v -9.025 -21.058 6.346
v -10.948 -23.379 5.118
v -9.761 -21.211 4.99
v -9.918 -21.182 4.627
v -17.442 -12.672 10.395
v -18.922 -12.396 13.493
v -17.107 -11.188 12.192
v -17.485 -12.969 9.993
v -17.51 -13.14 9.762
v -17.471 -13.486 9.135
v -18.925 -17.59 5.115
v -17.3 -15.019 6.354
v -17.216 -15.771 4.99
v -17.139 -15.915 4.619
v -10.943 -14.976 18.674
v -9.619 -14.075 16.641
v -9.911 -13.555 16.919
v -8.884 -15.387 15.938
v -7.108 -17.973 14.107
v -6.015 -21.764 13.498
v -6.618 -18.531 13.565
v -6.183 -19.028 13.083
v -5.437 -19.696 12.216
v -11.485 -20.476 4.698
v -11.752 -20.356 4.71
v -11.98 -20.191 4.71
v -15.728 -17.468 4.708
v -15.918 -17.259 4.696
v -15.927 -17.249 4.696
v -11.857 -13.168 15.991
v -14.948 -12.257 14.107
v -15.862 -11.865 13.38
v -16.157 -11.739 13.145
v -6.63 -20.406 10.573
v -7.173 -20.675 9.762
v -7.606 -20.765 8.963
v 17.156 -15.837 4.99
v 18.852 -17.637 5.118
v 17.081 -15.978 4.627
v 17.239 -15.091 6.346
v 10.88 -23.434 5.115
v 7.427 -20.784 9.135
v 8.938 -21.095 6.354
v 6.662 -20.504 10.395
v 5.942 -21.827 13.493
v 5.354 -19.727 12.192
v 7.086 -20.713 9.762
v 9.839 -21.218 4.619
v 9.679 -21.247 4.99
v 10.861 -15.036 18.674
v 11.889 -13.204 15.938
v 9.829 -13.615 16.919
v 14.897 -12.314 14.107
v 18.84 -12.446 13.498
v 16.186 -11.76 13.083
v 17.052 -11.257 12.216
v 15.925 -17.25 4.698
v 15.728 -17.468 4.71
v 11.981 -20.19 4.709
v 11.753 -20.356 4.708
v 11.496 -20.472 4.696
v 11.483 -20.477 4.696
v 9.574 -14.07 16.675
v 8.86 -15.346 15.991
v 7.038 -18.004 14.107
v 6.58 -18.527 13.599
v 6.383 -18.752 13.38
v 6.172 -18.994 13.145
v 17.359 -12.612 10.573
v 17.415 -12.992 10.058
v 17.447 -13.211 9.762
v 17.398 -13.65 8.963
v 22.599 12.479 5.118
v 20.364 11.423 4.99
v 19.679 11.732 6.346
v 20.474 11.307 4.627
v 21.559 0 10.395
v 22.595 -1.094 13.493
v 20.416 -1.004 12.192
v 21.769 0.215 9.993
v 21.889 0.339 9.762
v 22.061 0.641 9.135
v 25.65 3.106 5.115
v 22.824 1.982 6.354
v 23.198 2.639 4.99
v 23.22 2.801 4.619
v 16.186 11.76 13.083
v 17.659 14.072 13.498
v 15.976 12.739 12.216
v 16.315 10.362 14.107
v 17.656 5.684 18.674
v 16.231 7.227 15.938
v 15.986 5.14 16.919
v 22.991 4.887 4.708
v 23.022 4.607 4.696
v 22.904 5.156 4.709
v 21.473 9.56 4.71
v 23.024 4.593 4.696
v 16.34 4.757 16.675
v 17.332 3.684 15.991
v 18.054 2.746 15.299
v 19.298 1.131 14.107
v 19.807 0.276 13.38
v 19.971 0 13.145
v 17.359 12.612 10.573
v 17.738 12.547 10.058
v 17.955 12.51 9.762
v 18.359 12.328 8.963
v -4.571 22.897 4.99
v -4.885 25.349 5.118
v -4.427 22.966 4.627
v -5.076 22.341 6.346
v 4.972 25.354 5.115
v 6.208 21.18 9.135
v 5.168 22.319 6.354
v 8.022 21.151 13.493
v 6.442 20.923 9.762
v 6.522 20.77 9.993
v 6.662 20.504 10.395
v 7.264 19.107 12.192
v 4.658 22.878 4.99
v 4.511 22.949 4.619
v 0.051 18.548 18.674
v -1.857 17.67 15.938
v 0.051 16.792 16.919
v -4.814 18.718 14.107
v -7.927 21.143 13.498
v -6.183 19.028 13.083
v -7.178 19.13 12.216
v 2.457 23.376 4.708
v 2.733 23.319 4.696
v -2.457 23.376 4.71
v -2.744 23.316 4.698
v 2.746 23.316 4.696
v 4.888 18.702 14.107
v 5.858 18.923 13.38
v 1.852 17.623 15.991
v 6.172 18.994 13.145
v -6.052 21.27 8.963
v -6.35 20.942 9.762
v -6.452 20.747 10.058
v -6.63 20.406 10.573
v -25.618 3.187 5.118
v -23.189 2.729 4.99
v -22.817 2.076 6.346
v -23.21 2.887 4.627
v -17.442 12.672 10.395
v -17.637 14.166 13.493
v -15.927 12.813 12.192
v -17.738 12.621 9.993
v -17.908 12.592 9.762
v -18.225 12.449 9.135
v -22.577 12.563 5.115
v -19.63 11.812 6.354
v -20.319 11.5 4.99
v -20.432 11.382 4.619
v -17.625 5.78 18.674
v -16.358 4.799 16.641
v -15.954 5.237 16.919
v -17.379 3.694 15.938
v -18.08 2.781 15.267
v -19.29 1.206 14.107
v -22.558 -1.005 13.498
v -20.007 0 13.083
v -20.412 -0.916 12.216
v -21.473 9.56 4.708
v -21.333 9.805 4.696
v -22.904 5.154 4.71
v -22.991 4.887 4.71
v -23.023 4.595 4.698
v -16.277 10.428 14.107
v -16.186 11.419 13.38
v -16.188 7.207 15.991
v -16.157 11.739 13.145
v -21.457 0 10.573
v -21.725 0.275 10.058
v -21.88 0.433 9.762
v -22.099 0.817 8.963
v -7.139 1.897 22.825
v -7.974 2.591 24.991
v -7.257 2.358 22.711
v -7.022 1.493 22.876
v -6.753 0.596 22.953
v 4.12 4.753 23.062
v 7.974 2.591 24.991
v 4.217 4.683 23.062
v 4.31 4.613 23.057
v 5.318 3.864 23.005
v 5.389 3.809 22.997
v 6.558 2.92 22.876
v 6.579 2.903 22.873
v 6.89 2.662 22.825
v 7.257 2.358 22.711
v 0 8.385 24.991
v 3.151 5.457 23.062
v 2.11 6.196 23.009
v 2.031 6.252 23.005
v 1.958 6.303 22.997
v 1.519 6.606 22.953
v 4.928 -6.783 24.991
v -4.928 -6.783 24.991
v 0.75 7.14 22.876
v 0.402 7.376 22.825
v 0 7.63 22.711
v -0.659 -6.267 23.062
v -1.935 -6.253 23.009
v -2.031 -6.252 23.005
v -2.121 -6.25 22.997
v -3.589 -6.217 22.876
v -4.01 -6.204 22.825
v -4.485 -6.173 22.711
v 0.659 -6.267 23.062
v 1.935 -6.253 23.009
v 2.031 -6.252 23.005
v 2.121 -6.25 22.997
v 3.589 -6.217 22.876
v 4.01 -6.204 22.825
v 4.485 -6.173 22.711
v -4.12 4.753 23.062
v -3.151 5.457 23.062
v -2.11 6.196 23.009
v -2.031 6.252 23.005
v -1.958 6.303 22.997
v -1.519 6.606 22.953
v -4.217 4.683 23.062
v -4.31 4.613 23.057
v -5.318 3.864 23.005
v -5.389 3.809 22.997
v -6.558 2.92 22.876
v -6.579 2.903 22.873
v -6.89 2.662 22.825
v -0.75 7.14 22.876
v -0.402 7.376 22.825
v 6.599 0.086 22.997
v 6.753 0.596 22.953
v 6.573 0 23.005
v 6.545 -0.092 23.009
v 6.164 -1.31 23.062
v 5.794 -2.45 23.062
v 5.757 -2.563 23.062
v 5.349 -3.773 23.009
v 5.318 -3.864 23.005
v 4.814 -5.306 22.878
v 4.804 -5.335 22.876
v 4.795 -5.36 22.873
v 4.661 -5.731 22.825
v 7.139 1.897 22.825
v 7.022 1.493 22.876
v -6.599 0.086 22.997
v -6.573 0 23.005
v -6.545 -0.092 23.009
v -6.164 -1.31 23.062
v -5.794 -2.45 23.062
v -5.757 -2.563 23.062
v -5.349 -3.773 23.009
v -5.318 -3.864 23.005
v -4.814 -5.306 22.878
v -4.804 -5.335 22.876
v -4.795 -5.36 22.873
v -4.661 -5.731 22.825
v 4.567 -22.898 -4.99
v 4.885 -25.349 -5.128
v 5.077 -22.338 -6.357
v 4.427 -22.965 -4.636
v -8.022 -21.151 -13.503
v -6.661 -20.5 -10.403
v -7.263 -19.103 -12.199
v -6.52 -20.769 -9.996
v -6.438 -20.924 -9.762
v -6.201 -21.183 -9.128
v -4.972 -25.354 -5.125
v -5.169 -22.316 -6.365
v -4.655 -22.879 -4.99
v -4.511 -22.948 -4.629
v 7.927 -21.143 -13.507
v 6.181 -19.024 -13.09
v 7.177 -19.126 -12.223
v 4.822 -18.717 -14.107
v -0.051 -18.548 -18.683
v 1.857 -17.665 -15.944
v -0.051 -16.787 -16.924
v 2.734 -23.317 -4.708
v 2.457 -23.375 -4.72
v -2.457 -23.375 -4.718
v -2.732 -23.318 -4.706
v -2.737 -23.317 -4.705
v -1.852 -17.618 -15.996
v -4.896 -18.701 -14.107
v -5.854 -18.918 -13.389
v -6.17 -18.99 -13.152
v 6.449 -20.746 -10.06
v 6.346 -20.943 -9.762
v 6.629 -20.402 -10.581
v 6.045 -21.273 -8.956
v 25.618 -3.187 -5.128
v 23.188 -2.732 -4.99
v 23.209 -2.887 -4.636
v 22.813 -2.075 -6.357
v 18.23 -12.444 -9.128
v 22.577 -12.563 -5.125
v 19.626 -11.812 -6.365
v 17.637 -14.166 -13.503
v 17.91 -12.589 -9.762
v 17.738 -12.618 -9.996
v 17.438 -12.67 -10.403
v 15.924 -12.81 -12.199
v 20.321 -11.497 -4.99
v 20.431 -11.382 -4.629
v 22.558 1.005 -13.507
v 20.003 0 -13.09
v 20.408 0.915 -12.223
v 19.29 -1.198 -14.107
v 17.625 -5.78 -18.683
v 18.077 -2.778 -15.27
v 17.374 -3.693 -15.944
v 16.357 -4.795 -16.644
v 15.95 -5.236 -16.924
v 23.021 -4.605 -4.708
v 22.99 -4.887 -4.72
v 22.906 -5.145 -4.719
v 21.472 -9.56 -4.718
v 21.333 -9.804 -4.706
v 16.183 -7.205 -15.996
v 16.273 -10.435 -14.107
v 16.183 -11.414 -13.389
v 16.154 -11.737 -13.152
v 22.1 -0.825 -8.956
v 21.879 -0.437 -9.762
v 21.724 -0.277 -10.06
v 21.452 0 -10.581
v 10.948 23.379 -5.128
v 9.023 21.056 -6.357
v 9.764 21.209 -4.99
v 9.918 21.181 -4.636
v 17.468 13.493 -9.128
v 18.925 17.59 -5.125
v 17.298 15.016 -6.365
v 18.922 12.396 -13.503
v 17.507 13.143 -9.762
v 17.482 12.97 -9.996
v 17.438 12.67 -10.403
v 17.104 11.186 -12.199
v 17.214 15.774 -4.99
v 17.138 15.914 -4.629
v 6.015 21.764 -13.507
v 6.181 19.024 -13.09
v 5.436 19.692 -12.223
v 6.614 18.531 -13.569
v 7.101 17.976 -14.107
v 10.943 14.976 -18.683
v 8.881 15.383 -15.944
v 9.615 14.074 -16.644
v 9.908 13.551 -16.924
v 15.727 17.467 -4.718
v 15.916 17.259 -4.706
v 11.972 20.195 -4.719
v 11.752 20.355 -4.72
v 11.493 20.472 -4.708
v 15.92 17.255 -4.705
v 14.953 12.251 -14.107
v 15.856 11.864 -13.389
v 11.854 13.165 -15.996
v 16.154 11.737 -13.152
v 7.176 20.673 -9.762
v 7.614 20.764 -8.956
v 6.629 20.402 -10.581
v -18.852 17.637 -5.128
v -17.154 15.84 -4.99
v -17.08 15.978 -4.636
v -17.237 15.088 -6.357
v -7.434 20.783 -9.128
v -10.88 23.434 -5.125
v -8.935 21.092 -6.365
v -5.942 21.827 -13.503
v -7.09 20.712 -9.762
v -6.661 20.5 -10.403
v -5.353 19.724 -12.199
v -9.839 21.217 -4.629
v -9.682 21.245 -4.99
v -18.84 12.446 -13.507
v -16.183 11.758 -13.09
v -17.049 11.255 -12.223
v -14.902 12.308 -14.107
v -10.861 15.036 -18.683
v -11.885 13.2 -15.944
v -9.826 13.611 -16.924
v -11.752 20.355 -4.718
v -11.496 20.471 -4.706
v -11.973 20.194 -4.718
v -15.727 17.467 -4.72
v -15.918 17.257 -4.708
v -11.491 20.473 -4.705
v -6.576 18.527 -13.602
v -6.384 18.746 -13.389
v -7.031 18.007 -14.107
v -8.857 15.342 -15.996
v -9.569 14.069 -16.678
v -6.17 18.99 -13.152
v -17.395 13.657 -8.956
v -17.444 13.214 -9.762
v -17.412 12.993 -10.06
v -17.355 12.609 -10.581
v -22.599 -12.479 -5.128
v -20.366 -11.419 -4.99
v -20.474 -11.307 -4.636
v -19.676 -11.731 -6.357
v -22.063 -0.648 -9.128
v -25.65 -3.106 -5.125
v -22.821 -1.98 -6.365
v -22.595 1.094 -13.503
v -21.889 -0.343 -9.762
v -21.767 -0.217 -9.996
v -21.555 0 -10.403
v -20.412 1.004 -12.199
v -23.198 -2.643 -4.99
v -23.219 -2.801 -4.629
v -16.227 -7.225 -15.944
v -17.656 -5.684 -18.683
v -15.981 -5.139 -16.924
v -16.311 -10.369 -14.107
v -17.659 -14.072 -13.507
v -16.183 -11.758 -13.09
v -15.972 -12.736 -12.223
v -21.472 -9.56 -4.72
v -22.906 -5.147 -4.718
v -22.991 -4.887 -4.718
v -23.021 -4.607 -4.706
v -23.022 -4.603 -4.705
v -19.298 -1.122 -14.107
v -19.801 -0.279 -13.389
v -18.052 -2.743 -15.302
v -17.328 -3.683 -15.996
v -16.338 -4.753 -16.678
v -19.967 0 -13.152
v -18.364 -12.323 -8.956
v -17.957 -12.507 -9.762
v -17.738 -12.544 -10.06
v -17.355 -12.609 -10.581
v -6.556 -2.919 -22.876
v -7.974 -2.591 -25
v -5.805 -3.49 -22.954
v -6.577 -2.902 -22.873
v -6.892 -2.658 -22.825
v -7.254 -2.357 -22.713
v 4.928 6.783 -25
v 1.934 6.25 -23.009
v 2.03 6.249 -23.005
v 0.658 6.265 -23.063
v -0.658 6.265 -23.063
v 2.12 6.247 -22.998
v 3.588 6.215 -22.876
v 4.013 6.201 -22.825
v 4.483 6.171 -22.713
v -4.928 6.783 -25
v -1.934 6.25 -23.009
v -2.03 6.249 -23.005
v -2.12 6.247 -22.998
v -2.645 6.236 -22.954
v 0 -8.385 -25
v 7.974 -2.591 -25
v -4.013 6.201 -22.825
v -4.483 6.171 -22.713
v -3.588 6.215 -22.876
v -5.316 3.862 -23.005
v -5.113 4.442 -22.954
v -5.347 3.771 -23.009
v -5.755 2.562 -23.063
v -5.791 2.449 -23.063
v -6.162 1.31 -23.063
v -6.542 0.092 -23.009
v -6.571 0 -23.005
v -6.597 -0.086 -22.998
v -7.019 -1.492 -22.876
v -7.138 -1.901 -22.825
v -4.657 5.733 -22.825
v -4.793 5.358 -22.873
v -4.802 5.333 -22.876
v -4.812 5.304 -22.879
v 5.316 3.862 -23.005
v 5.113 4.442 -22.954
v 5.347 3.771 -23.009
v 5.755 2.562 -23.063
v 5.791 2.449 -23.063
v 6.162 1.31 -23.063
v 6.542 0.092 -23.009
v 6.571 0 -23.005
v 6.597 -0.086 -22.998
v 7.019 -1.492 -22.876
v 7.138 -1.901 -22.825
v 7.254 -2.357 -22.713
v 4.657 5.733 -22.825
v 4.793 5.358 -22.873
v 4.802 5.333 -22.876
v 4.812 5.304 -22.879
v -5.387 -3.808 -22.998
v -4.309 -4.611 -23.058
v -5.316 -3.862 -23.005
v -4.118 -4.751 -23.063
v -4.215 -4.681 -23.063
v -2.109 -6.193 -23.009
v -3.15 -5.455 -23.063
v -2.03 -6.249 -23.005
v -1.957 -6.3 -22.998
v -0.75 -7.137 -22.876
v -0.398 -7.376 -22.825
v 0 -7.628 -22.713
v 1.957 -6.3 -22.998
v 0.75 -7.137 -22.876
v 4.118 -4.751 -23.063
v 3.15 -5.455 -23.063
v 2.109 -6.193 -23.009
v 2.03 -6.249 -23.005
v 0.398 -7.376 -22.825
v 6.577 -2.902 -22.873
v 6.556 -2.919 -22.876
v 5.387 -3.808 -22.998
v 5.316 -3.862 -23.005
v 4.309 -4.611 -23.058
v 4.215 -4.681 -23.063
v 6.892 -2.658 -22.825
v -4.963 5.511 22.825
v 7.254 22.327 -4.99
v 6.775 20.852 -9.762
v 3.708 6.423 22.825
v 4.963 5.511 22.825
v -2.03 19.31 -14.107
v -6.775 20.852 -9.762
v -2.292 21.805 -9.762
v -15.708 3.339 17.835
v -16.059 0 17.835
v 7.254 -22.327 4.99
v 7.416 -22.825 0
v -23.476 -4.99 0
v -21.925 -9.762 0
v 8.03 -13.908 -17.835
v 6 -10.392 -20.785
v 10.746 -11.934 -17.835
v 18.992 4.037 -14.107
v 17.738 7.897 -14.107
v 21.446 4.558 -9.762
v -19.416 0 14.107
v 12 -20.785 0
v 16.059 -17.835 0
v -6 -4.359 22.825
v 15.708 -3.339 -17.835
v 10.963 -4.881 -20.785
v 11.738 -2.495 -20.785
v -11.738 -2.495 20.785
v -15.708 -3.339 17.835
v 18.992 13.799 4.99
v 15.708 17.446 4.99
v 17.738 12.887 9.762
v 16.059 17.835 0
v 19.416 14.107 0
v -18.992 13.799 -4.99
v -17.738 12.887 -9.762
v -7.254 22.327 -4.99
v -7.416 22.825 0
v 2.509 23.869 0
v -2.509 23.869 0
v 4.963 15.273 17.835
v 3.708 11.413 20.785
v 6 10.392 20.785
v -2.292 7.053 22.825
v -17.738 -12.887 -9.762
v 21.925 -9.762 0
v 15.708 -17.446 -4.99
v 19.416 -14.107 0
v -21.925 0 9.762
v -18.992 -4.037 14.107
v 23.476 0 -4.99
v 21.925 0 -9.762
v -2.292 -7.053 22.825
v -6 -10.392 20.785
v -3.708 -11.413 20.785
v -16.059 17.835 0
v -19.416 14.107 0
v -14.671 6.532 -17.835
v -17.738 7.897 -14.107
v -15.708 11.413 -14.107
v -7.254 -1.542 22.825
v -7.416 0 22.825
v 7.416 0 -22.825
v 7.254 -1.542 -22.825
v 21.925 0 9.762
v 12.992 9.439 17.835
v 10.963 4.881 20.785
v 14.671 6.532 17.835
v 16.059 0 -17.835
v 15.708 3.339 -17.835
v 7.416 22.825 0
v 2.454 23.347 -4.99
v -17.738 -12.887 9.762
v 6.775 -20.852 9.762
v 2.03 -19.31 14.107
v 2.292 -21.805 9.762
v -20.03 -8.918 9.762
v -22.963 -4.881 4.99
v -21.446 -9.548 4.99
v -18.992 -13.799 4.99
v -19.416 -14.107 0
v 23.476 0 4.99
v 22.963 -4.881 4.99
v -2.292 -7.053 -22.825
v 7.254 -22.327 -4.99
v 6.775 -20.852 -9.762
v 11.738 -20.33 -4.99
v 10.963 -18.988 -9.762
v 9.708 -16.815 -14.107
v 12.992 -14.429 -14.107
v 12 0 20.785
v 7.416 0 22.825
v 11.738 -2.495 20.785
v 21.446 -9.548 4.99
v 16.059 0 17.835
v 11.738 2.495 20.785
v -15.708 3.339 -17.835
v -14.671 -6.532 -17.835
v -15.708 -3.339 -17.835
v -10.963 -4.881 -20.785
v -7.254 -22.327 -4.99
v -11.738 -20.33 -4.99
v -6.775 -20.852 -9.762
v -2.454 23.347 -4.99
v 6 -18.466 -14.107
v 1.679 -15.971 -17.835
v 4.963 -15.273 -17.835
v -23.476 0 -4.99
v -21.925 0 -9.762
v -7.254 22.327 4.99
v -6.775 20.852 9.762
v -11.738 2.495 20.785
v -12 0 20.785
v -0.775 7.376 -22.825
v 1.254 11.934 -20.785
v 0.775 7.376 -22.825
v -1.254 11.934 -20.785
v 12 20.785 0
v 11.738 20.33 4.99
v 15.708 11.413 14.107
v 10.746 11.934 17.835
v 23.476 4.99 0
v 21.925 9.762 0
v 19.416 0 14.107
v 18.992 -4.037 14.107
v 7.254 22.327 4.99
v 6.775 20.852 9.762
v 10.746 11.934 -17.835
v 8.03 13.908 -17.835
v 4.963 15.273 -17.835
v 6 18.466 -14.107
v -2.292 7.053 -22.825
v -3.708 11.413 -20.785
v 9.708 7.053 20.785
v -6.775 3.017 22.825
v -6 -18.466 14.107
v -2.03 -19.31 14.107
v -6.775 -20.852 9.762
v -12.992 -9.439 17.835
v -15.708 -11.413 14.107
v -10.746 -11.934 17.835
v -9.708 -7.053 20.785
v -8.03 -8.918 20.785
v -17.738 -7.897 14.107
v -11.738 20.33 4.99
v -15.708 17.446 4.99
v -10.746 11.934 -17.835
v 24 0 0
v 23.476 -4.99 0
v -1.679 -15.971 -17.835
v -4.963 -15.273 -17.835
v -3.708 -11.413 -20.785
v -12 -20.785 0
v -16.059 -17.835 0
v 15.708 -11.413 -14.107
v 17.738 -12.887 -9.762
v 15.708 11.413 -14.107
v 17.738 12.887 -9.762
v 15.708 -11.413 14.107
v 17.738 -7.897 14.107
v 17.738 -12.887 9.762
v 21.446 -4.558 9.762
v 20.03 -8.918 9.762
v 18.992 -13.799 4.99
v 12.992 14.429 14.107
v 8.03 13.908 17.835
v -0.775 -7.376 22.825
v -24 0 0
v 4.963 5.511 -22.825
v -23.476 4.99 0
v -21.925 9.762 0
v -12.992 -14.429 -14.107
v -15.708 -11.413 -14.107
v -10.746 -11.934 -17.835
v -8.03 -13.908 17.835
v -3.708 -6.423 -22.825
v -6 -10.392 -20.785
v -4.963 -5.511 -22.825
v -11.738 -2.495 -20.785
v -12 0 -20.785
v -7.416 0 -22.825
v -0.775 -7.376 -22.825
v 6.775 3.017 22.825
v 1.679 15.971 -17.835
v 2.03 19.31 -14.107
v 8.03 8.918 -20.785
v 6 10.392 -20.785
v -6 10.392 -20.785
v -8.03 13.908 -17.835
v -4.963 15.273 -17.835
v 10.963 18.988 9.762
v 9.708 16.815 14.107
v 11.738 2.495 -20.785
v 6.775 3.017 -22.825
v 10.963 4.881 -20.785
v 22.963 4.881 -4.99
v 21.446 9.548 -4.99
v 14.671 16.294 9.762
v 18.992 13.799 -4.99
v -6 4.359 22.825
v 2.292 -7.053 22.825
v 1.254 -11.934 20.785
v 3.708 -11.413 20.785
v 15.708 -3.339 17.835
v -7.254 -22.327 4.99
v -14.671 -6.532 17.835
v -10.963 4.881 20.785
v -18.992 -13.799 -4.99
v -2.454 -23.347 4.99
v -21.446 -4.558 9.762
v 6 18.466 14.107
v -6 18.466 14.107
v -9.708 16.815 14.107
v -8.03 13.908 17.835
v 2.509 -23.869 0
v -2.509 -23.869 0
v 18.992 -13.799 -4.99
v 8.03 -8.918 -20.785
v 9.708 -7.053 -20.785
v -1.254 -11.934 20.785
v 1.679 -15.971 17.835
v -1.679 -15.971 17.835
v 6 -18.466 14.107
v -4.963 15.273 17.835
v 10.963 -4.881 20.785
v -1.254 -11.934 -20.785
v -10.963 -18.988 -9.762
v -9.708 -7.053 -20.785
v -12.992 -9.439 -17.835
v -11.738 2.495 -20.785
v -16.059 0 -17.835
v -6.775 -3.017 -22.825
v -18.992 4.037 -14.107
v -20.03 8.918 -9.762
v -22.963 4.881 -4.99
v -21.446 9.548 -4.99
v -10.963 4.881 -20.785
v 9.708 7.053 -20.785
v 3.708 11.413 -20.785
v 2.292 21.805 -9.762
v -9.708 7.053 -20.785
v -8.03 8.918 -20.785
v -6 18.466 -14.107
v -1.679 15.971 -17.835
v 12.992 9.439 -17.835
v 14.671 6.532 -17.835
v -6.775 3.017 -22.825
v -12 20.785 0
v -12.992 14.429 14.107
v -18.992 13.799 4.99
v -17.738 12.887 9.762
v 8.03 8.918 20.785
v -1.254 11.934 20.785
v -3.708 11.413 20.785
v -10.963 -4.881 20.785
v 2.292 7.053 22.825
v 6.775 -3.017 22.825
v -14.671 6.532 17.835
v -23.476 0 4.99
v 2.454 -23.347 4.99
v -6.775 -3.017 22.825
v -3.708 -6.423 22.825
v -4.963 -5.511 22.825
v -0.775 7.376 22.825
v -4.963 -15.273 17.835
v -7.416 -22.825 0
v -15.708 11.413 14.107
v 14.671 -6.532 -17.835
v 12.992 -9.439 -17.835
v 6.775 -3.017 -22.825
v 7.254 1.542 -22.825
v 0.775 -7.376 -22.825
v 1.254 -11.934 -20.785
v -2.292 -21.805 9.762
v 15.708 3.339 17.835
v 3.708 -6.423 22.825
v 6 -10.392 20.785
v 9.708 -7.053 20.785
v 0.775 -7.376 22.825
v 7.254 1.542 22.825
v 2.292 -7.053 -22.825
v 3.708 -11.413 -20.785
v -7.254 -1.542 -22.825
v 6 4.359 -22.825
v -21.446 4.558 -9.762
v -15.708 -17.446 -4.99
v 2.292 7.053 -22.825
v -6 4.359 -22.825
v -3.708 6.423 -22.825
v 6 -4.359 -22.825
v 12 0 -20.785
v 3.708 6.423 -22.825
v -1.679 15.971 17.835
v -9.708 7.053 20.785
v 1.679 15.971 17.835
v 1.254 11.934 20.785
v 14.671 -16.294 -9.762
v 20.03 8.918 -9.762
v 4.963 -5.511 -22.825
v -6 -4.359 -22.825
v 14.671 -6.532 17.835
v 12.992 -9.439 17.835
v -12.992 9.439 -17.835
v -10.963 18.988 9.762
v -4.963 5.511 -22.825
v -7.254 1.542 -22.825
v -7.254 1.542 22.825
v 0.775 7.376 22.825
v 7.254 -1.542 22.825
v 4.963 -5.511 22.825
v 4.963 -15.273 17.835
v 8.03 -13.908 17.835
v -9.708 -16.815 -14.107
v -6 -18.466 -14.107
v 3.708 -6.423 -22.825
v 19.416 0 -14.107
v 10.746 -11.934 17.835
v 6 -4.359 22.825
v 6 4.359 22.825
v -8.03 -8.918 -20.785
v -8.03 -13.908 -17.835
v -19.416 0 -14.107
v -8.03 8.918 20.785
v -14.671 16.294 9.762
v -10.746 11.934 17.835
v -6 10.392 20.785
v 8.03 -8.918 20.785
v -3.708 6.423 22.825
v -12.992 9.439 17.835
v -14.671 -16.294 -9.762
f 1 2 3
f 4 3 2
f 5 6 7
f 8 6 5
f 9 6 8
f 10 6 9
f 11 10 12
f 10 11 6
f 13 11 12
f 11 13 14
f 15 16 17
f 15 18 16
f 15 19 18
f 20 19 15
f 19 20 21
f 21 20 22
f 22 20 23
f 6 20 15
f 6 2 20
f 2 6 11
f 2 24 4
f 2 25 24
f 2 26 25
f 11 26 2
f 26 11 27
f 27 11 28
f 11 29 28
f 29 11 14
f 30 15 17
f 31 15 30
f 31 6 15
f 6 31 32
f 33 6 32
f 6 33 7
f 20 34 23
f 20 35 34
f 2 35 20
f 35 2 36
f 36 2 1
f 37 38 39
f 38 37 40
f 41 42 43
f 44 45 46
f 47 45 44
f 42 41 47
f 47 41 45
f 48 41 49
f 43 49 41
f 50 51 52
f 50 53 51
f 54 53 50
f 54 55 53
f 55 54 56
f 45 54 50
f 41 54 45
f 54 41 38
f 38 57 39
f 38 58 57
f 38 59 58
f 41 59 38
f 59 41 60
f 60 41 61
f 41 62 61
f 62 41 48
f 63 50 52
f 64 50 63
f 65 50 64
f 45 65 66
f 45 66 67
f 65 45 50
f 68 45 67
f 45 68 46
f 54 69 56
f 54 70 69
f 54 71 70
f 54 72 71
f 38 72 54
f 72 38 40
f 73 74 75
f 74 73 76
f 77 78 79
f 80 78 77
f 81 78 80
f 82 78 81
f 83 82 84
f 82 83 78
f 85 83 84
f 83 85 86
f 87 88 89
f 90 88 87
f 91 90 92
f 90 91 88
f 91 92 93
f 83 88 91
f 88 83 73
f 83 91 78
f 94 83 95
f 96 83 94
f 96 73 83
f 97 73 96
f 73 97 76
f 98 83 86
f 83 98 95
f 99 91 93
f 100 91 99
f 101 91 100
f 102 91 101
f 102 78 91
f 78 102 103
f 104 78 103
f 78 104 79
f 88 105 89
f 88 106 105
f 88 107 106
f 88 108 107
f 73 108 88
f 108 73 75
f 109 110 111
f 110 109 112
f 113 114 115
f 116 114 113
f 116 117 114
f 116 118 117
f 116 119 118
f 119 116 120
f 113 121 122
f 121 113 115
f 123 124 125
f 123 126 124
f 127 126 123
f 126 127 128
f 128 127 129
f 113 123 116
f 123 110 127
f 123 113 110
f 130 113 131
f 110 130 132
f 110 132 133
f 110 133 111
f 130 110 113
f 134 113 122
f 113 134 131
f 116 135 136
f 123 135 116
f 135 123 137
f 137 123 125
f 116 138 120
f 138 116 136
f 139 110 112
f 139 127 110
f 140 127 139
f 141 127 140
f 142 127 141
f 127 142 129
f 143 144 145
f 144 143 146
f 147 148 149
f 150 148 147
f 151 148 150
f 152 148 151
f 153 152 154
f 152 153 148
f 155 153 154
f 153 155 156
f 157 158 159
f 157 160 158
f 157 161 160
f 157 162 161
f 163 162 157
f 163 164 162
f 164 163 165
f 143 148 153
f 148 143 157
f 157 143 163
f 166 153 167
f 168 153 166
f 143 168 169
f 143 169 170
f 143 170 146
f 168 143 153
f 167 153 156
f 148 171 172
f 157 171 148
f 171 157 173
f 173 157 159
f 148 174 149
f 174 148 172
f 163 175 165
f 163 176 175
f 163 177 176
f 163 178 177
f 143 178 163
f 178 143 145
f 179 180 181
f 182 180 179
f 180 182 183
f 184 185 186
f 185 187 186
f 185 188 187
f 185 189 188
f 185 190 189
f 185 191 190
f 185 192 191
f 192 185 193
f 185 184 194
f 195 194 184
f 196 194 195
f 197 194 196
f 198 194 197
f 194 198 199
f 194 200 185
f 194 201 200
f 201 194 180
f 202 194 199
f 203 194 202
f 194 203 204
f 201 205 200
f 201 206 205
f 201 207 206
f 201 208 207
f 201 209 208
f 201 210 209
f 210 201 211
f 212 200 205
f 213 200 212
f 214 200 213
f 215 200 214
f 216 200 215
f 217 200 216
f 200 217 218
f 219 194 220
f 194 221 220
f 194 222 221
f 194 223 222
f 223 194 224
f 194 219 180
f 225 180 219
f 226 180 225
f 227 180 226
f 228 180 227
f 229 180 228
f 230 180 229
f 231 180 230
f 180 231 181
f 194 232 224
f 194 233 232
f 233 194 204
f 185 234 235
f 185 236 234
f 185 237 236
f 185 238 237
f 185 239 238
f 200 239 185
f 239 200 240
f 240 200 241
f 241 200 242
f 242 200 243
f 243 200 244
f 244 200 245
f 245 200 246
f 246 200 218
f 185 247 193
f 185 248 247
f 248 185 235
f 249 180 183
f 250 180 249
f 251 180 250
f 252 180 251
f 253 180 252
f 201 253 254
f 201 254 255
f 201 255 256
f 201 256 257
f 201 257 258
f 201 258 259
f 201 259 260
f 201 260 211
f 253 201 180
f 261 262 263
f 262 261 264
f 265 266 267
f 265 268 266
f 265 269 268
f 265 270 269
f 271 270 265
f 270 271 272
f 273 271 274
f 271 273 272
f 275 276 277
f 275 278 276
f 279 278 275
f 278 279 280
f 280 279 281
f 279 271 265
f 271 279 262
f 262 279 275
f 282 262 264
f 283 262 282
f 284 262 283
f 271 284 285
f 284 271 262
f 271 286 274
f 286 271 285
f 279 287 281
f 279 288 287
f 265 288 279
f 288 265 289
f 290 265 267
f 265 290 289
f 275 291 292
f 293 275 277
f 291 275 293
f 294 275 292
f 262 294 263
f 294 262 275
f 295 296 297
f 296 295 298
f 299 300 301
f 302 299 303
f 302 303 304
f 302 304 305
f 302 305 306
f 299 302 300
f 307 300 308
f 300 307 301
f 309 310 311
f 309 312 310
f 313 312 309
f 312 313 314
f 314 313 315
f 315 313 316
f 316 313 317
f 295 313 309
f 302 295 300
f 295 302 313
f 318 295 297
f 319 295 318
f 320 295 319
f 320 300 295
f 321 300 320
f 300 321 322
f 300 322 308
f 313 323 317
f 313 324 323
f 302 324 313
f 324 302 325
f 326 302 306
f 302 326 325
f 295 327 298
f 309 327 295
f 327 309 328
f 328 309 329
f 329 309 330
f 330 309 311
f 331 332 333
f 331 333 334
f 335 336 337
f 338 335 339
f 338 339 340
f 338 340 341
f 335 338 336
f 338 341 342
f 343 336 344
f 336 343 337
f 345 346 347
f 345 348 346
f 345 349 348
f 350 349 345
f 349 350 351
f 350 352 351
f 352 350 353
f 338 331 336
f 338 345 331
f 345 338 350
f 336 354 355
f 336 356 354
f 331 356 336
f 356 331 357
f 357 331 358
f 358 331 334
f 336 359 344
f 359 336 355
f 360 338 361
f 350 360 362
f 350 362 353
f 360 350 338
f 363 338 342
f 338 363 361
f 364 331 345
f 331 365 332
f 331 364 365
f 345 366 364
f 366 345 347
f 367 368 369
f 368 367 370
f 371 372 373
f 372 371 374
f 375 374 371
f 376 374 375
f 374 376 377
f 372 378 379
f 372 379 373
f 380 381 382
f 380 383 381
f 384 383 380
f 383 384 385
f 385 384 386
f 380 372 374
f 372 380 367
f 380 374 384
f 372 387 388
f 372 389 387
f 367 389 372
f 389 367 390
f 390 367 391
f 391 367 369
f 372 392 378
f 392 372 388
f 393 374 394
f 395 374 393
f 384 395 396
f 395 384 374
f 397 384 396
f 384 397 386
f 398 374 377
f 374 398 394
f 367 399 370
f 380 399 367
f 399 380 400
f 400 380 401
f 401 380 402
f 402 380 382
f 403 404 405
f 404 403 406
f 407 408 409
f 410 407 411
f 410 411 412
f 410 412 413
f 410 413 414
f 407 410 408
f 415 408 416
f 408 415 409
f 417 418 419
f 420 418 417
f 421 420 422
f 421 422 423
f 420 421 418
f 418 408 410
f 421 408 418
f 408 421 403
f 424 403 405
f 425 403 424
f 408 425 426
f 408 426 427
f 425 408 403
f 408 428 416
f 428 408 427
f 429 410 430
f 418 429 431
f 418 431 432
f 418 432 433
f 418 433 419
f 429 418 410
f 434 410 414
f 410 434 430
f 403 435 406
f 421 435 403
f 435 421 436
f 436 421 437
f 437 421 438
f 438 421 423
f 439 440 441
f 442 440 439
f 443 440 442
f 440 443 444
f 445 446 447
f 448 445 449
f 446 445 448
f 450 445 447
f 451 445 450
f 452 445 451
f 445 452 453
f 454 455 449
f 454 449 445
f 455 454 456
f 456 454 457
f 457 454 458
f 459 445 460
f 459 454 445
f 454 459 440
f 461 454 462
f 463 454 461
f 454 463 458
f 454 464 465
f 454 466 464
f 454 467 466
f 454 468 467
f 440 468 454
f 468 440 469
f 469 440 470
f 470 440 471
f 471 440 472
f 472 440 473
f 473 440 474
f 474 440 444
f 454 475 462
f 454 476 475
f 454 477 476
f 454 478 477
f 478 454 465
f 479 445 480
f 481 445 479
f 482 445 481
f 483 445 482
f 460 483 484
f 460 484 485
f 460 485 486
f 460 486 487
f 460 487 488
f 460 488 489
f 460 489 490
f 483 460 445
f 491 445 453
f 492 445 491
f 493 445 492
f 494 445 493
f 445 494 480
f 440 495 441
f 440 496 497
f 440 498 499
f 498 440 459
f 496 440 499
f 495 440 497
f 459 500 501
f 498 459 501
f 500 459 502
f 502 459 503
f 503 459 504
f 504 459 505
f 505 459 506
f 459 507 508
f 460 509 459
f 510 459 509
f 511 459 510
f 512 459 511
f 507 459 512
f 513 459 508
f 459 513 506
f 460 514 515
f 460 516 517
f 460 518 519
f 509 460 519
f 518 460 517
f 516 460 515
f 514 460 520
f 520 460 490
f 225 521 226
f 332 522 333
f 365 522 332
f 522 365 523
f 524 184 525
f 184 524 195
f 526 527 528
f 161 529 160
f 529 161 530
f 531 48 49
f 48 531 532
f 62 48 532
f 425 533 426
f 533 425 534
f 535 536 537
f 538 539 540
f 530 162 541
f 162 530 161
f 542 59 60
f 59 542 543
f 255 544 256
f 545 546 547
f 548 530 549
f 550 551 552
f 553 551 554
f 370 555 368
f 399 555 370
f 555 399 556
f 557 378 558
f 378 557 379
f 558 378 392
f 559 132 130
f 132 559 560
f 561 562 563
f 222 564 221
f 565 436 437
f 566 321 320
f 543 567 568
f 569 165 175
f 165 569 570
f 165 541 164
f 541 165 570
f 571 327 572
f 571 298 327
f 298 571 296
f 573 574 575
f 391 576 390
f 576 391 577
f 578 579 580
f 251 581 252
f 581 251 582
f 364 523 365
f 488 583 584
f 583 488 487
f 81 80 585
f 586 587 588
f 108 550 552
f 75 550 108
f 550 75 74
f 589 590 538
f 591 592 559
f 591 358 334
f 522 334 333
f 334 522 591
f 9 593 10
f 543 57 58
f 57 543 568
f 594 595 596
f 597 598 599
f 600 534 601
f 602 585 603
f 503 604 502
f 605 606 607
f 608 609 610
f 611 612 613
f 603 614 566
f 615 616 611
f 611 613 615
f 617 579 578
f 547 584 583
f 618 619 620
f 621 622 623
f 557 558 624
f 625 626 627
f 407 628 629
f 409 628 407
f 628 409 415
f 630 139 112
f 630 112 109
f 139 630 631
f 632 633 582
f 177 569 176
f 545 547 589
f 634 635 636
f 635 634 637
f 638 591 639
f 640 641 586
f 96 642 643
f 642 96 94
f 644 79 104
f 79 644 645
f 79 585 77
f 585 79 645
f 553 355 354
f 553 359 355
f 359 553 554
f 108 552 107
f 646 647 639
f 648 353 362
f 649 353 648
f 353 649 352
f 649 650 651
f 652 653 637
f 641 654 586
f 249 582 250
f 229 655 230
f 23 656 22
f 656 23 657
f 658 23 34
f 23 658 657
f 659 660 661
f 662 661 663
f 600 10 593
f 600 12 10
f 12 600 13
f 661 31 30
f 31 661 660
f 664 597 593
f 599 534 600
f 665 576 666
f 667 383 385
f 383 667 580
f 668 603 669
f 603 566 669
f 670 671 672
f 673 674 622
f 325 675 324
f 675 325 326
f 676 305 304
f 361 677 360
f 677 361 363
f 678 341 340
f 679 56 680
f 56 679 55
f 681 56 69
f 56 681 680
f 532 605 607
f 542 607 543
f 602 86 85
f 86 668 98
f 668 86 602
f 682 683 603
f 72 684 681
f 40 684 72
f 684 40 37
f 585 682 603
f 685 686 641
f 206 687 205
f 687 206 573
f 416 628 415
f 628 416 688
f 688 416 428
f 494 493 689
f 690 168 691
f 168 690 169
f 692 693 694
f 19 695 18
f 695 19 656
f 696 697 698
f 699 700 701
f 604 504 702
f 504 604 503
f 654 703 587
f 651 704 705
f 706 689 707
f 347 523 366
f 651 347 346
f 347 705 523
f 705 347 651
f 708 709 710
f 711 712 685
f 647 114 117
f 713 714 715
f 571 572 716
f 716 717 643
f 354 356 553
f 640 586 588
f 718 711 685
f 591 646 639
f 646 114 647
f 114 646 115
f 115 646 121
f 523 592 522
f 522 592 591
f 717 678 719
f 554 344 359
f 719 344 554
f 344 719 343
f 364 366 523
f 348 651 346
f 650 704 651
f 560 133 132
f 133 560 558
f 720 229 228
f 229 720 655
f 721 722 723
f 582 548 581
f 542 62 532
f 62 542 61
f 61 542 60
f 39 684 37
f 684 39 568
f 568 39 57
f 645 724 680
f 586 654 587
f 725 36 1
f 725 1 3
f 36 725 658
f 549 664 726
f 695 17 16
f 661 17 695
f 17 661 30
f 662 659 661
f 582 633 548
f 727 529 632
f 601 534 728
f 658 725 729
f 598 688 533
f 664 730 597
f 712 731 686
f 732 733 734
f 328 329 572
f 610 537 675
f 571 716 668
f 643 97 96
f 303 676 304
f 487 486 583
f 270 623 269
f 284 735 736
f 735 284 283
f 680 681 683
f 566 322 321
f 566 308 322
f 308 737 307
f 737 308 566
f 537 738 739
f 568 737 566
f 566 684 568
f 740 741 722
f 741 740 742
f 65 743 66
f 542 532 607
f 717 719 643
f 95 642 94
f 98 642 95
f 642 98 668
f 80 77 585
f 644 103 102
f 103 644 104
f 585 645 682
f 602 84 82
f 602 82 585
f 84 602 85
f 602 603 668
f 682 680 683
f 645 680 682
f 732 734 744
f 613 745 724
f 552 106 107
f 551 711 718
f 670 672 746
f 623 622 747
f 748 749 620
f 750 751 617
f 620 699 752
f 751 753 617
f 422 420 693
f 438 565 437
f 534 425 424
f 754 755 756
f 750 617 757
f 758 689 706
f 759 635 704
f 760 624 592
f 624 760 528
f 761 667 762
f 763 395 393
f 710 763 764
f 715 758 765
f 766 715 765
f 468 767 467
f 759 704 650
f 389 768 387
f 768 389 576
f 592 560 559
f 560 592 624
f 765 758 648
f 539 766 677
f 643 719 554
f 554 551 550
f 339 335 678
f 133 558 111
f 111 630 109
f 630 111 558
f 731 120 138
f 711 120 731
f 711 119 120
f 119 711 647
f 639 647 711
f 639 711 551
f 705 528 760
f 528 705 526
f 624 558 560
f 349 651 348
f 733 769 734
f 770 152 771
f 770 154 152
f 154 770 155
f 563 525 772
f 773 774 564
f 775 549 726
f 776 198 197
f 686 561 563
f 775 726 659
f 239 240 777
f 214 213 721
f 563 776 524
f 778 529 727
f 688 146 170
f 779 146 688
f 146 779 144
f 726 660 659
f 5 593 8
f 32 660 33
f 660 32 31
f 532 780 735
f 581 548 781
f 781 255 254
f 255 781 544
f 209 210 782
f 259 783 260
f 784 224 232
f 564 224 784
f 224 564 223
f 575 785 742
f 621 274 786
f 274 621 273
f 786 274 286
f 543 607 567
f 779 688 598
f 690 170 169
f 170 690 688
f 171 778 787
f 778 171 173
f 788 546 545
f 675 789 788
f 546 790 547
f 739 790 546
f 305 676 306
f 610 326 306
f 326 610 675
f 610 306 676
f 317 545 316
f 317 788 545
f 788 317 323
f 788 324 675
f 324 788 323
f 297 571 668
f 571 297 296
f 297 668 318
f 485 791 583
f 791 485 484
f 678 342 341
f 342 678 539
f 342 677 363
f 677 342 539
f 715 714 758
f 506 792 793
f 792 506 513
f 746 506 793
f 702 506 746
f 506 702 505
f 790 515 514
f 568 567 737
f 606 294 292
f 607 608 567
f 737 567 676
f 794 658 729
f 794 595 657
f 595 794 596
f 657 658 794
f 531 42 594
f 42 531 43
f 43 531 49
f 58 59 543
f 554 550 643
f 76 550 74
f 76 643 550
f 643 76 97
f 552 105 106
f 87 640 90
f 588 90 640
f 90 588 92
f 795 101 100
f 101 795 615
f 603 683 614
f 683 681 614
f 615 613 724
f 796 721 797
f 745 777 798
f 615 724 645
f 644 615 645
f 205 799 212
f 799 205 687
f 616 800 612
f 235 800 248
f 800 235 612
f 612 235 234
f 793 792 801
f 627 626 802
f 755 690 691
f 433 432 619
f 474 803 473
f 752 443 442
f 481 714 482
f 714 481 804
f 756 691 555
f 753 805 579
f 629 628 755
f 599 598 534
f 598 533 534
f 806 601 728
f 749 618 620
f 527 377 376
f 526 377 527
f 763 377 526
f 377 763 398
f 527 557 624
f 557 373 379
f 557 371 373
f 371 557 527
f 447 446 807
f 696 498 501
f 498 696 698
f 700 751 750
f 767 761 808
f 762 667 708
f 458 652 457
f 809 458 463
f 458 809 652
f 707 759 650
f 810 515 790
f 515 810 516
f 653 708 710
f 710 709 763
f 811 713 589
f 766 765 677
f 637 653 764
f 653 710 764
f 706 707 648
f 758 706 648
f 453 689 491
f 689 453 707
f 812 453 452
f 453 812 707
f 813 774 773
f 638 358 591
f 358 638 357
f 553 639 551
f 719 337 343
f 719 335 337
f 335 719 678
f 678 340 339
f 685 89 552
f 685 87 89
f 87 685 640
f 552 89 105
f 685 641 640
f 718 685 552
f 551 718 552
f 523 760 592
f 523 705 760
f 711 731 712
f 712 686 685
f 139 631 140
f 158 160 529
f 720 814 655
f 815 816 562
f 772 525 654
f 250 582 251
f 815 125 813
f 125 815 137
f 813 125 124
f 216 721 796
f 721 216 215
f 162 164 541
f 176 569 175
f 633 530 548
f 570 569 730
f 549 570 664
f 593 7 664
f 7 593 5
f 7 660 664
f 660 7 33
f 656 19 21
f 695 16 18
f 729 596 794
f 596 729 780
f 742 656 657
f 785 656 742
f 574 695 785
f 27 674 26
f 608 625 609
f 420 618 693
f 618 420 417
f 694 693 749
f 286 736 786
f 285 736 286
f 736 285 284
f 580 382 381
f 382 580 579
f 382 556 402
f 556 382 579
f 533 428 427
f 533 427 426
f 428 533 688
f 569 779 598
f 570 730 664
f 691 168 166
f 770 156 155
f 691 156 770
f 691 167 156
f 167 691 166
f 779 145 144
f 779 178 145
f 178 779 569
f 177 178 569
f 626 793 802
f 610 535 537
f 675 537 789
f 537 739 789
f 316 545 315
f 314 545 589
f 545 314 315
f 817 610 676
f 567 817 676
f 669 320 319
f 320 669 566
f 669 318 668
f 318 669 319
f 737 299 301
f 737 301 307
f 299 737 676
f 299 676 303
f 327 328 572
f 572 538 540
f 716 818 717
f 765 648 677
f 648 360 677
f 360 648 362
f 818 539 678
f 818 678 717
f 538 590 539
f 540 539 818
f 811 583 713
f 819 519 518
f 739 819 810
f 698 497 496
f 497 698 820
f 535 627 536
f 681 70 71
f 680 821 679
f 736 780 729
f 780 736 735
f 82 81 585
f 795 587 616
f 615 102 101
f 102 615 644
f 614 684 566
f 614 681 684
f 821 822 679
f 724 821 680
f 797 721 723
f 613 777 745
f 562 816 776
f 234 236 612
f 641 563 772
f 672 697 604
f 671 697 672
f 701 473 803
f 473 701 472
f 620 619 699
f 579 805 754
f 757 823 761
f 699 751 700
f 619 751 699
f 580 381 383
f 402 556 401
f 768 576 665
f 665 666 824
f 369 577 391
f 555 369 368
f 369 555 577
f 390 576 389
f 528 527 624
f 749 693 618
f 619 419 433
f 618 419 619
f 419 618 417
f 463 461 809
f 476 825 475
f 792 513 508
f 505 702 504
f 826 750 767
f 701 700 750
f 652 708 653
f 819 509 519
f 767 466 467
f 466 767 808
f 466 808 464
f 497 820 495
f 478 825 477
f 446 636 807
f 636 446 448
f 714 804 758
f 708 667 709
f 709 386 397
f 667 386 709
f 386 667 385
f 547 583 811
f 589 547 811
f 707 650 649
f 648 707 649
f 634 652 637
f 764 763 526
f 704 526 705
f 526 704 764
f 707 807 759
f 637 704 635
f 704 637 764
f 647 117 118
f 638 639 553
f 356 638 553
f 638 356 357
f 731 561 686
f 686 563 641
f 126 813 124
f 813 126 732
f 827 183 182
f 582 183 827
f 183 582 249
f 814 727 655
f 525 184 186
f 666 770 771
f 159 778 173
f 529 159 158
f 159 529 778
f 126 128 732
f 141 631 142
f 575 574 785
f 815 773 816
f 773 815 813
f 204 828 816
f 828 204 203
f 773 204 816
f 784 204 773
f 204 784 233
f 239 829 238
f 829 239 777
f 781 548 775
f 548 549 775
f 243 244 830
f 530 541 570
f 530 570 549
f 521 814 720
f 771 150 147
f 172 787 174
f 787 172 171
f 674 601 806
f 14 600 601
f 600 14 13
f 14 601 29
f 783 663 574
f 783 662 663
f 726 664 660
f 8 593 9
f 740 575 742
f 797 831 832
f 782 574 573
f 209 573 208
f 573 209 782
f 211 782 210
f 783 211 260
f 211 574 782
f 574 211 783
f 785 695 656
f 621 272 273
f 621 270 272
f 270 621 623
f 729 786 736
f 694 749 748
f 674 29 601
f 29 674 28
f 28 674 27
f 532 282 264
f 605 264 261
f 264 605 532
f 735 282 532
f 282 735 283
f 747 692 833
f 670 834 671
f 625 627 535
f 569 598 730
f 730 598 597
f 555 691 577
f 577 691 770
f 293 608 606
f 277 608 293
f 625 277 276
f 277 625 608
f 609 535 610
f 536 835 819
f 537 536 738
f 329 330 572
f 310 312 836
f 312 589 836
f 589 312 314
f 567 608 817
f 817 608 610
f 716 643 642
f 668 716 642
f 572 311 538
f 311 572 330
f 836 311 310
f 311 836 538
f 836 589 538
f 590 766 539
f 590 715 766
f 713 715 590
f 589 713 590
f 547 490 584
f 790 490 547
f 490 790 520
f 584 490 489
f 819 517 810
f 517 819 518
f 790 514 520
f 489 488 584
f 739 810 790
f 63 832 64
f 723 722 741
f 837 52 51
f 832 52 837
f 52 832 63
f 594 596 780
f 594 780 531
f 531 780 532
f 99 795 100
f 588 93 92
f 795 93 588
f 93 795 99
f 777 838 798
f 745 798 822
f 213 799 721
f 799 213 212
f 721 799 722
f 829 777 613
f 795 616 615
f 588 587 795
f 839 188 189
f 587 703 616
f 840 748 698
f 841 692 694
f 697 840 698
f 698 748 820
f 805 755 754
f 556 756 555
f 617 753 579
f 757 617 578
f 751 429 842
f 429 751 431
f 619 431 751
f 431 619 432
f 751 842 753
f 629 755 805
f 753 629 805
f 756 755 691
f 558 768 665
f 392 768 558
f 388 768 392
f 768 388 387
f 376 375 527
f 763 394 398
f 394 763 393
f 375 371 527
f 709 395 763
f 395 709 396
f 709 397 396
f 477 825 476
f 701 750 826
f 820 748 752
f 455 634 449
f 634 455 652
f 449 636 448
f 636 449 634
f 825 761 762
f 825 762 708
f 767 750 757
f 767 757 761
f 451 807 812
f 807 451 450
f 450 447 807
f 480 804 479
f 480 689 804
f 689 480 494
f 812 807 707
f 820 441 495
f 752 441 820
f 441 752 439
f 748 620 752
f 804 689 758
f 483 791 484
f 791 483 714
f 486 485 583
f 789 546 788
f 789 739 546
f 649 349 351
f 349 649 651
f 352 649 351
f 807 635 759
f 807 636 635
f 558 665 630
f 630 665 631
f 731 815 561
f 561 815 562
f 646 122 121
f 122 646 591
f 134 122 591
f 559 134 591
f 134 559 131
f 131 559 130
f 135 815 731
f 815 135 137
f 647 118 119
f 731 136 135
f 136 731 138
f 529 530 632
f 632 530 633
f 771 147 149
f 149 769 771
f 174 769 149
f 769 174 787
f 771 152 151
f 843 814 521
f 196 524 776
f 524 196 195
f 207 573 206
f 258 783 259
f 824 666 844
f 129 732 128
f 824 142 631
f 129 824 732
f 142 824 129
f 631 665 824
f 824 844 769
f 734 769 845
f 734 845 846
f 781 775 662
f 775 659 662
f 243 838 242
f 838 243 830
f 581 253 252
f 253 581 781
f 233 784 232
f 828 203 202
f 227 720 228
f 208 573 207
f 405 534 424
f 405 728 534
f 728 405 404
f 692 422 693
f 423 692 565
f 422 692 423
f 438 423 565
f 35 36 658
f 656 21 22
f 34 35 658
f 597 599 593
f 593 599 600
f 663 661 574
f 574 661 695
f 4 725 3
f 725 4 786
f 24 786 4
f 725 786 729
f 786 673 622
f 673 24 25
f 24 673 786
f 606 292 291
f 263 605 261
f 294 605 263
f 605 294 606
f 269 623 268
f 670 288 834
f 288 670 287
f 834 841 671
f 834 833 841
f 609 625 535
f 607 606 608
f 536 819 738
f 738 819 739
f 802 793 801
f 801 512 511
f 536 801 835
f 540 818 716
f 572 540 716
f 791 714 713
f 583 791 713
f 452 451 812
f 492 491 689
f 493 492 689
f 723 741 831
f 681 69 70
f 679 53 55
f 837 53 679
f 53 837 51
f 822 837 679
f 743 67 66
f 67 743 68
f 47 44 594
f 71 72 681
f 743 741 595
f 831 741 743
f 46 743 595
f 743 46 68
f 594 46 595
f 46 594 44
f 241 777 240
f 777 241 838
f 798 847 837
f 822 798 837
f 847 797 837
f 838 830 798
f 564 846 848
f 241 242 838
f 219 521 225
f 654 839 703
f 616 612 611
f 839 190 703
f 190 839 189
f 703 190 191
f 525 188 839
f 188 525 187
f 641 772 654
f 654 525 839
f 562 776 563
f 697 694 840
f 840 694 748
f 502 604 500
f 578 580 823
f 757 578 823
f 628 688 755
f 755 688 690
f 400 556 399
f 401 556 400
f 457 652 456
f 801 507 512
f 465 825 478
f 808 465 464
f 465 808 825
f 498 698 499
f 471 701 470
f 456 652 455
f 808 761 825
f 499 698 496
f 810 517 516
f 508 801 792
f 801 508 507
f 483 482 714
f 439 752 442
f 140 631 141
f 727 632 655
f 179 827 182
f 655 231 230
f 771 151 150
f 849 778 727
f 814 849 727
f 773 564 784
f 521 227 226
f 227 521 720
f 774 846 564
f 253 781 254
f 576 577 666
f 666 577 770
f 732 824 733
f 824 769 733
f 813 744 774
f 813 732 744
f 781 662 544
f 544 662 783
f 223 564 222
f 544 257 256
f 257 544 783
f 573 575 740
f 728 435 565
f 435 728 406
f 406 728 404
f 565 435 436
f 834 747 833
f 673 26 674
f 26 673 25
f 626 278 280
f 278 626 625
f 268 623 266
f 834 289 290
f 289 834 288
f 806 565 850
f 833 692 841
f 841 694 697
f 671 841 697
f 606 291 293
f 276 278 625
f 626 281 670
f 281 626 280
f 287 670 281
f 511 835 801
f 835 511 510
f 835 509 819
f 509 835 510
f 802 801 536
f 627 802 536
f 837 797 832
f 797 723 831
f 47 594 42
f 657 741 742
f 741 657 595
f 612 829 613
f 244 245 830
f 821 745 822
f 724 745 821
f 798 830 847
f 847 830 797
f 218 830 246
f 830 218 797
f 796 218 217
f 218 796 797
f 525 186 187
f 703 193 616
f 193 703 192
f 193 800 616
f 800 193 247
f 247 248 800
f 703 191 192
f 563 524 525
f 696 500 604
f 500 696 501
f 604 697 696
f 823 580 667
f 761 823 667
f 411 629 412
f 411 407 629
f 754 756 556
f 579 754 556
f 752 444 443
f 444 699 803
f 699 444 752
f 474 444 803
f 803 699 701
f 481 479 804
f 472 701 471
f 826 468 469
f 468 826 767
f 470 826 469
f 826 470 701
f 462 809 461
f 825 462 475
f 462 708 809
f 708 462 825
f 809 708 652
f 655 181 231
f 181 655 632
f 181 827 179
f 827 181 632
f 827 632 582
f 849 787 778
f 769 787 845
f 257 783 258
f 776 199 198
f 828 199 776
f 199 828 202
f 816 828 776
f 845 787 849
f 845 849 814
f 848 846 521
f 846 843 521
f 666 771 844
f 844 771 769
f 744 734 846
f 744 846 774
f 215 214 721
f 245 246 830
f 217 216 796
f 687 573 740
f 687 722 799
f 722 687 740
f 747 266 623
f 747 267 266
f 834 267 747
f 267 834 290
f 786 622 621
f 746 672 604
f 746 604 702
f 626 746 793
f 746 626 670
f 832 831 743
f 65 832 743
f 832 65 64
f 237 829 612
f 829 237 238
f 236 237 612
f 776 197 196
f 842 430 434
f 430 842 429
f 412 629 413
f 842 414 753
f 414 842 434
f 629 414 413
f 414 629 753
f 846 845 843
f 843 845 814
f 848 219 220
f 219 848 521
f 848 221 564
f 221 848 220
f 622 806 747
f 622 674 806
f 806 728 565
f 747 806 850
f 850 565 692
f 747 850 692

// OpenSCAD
height = 50; 
maze_in = "hexagon"; // [pentagon, hexagon, both]

// give a [x, y] point and length. draw a line in the x direction
module x_line(point, length, thickness = 1) {
    offset = thickness / 2;
    translate([point[0] - offset, point[1] - offset, 0]) 
        square([length + thickness, thickness]);
}

/*
 * constants, for clearness
 *
 */
 
// random directions, for picking up a direction to visit the next block
function PERMUTATION_OF_FOUR() = [
    [1, 2, 3, 4],
    [1, 2, 4, 3],
    [1, 3, 2, 4],
    [1, 3, 4, 2],
    [1, 4, 2, 3],
    [1, 4, 3, 2],
    [2, 1, 3, 4],
    [2, 1, 4, 3],
    [2, 3, 1, 4],
    [2, 3, 4, 1],
    [2, 4, 1, 3],
    [2, 4, 3, 1],
    [3, 1, 2, 4],
    [3, 1, 4, 2],
    [3, 2, 1, 4],
    [3, 2, 4, 1],
    [3, 4, 1, 2],
    [3, 4, 2, 1],
    [4, 1, 2, 3],
    [4, 1, 3, 2],
    [4, 2, 1, 3],
    [4, 2, 3, 1],
    [4, 3, 1, 2],
    [4, 3, 2, 1]
];

function NO_WALL() = 0;
function UP_WALL() = 1;
function RIGHT_WALL() = 2;
function UP_RIGHT_WALL() = 3;

function NOT_VISITED() = 0;
function VISITED() = 1;

/* 
 * modules for creating a maze
 *
 */

// create the outer wall of maze
module maze_outer_wall(rows, columns, block_width = 5, wall_thickness = 1) {
    x_line([0, rows * block_width], columns * block_width, wall_thickness);
    y_line([0, block_width], (rows - 1) * block_width, wall_thickness);
}

// create the inner wall of maze
module maze_inner_wall(maze, block_width = 5, wall_thickness = 1) {
    for(i = [0:len(maze) - 1]) {
        cord = maze[i];
        x = (cord[0] - 1) * block_width;
        y = (cord[1] - 1) * block_width;
        v = cord[3];
        
        if(v == 1 || v == 3) {
            x_line([x, y], block_width, wall_thickness);
        }
        if(v == 2 || v == 3) {
            y_line([x + block_width, y], block_width, wall_thickness);
        }
    }  
}

// create a maze
module maze(rows, columns, maze_vector, block_width = 5, wall_thickness = 1) {
     maze_outer_wall(rows, columns, block_width, wall_thickness);
     maze_inner_wall(maze_vector, block_width, wall_thickness);
}

/* 
 * utilities functions
 *
 */

// comare the equality of [x1, y1] and [x2, y2]
function cord_equals(cord1, cord2) = cord1 == cord2;

// is the point visited?
function not_visited(cord, vs, index = 0) =
    index == len(vs) ? true : 
        (cord_equals([vs[index][0], vs[index][1]], cord) && vs[index][2] == 1 ? false :
            not_visited(cord, vs, index + 1));
            
// pick a direction randomly
function rand_dirs() =
    PERMUTATION_OF_FOUR()[round(rands(0, 24, 1)[0])]; 

// replace v1 in the vector with v2 
function replace(v1, v2, vs) =
    [for(i = [0:len(vs) - 1]) vs[i] == v1 ? v2 : vs[i]];
	 
/* 
 * functions for generating a maze vector
 *
 */


// initialize a maze
function init_maze(rows, columns) = 
    [
	    for(c = [1 : columns]) 
	        for(r = [1 : rows]) 
		        [c, r, 0,  UP_RIGHT_WALL()]
	];
    
// find a vector in the maze vector
function find(i, j, maze_vector, index = 0) =
    index == len(maze_vector) ? [] : (
        cord_equals([i, j], [maze_vector[index][0], maze_vector[index][1]]) ? maze_vector[index] : find(i, j, maze_vector, index + 1)
    );

////
// NO_WALL = 0;
// UP_WALL = 1;
// RIGHT_WALL = 2;
// UP_RIGHT_WALL = 3;
function delete_right_wall(original_block) = 
    original_block == NO_WALL() || original_block == RIGHT_WALL() ? NO_WALL() : UP_WALL();

function delete_up_wall(original_block) = 
    (original_block == NO_WALL() || original_block == UP_WALL()) ? NO_WALL() : RIGHT_WALL();
    
function delete_right_wall_of(vs, is_visited, maze_vector) =
    replace(vs, [vs[0], vs[1] , is_visited, delete_right_wall(vs[3])] ,maze_vector);

function delete_up_wall_of(vs, is_visited, maze_vector) =
    replace(vs, [vs[0], vs[1] , is_visited, delete_up_wall(vs[3])] ,maze_vector);

function go_right(i, j, rows, columns, maze_vector) =
    go_maze(i + 1, j, rows, columns, delete_right_wall_of(find(i, j, maze_vector), VISITED(), maze_vector));
    
function go_up(i, j, rows, columns, maze_vector) =
    go_maze(i, j - 1, rows, columns, delete_up_wall_of(find(i, j, maze_vector), VISITED(), maze_vector));
    
function visit(v, maze_vector) =
    replace(v, [v[0], v[1], VISITED(), v[3]], maze_vector);
 
function go_left(i, j, rows, columns, maze_vector) =
    go_maze(i - 1, j, rows, columns, delete_right_wall_of(find(i - 1, j, maze_vector), NOT_VISITED(), maze_vector));
    
function go_down(i, j, rows, columns, maze_vector) =
    go_maze(i, j + 1, rows, columns, delete_up_wall_of(find(i, j + 1, maze_vector), NOT_VISITED(), maze_vector));
    
function go_maze(i, j, rows, columns, maze_vector) =
    look_around(i, j, rand_dirs(), rows, columns, visit(find(i, j, maze_vector), maze_vector));
    
function look_around(i, j, dirs, rows, columns, maze_vector, index = 0) =
    index == 4 ? maze_vector : 
        look_around( 
            i, j, dirs, 
            rows, columns, 
            build_wall(i, j, dirs[index], rows, columns, maze_vector), 
            index + 1
        ); 

function build_wall(i, j, n, rows, columns, maze_vector) = 
    n == 1 && i != columns && not_visited([i + 1, j], maze_vector) ? go_right(i, j, rows, columns, maze_vector) : ( 
        n == 2 && j != 1 && not_visited([i, j - 1], maze_vector) ? go_up(i, j, rows, columns, maze_vector)  : (
            n == 3 && i != 1 && not_visited([i - 1, j], maze_vector) ? go_left(i, j,rows, columns,  maze_vector)  : (
                n == 4 && j != rows && not_visited([i, j + 1], maze_vector) ? go_down(i, j, rows, columns, maze_vector) : maze_vector
            ) 
        )
    ); 

module ring_regular_polygon(radius, thickness, sides) {
    difference() { 
	    offset(delta = thickness) circle(radius, $fn = sides);
        circle(radius, $fn = sides);
	}
}

module ring_regular_polygon_sector(radius, angle, thickness, width, sides) {
	intersection() {
		ring_regular_polygon(radius - 0.1, thickness + 0.2, sides);
		rotate([0, 0, angle]) x_line([0, 0], radius * 3, width);
	}
}

module regular_polygon_to_polygon_wall(radius, length, angle, thickness, sides) {
    intersection() {
        difference() {
		    circle(radius + length, $fn = sides);
			circle(radius, $fn = sides);
	    }
	    rotate([0, 0, angle]) 
		    x_line([0, 0], (radius + length) * 2, thickness);
	}
}

module regular_polygon_maze(radius, cblocks, levels, thickness = 1, sides) {
    full_circle_angle = 360;
    arc_angle = full_circle_angle / cblocks;
	r = radius / (levels + 1);
	
	maze = go_maze(1, 1, cblocks, levels, replace([levels, cblocks - 1, 0, UP_RIGHT_WALL()], [levels, cblocks - 1, 0, UP_WALL()], init_maze(cblocks, levels)));
	
	
	difference() {
		 union() {
			for(i = [1 : levels + 1]) {
			    ring_regular_polygon(r * i, thickness, sides);
			}
		  
		  
			for(i = [0:len(maze) - 1]) { 
				cord = maze[i];
				cr = cord[0]; 
				cc = cord[1] - 1;    
				v = cord[3];
				
				angle = cc * arc_angle;
				 
				if(v == 1 || v == 3) { 
				    regular_polygon_to_polygon_wall(r * cr, r, cc * arc_angle , thickness, sides);
				} 
			}
	    }
		
		 union() {
		    // maze entry
			ring_regular_polygon_sector(r, arc_angle / 1.975 , thickness, r / 3, sides);   

	        // road to the next level
			for(i = [0:len(maze) - 1]) { 
				cord = maze[i];
				cr = cord[0]; 
				cc = cord[1] - 1;    
				v = cord[3];
				
				if(v == 0 || v == 1) { 
				
				    ring_regular_polygon_sector(r * (cr + 1), (cc + 0.5) * arc_angle , thickness, r / 3 , sides);
				}  
			}
		}
	}
}

// create a generalized pentagon by length.
// Parameters:
//     length : the side length
//     spacing : the gap between a pentagon or a hexagon
module generalized_pentagon(length, spacing = 0.5) {
    r = 0.5 * length / sin(36);
	s = (r - spacing / 2) / r;

    color("yellow") 
	    rotate(18) 		     
		     linear_extrude(length, scale = 1.42215)
		        scale([s, s, s])
			        children(); 
}

// create a generalized hexagon by length.
// Parameters:
//     length : the side length
//     spacing : the gap between a pentagon or a hexagon
module generalized_hexagon(length, spacing = 0.5) {
    r = 0.5 * length / sin(30);
	s = (r - spacing / 2) / r;

    color("white") 
	     linear_extrude(length - length * 0.02125, scale = 1.42215) 
		    scale([s, s, s])			
		        children();
}

// two generalized pentagons and two generalized hexagons.
// Parameters:
//     length : the side length
//     spacing : the gap between the pentagon and hexagon
module generalized_pentagon_based_sub_comp(length, spacing = 0.5) {
	pentagon_circle_r = 0.5 * length / sin(36);
	
	a = 37.325;
	
	offset_y = 0.5 * length * tan(54) + pentagon_circle_r * cos(a);
	offset_z = 0.5 * length * tan(60) * sin(a);
	
	translate([0, -offset_y, -offset_z]) 
	    rotate([a, 0, 0]) 
		    generalized_hexagon_based_sub_comp(length, spacing) {
			    children(0); 
				children(1); 
			}
}


// two generalized hexagons and one generalized pentagon.
// Parameters:
//     length : the side length
//     spacing : the gap between the pentagon and hexagon
module generalized_hexagon_based_sub_comp(length, spacing = 0.5) {
    children(1); 
	
	length_center_to_side = 0.5 * length * tan(54);
	
    a = -37.325;
	
	offset_y = 0.5 * length * (tan(54) * cos(a) + tan(60));
	offset_z = length_center_to_side * sin(a);
	
	rotate(120) translate([0, offset_y, offset_z]) 
	    rotate([a, 0, 0]) 
	        generalized_pentagon_hexagon(length, spacing) {
			    children(0);
			    children(1);
			}
			
}

// a generalized pentagon and a generalized hexagon.
// Parameters:
//     length : the side length
//     spacing : the gap between the pentagon and hexagon
module generalized_pentagon_hexagon(length, spacing = 0.5) {
	pentagon_circle_r = 0.5 * length / sin(36);
	
	children(0); 
	
	a = 37.325;
	
	offset_y = 0.5 * length * tan(54) + pentagon_circle_r * cos(a);
	offset_z = 0.5 * length * tan(60) * sin(a);
	
	rotate(144) translate([0, -offset_y, -offset_z]) 
	    rotate([a, 0, 0]) 
		    children(1); 
}

// a half of generalized soccer polyhedron.
// Parameters:
//     line_length : the side length of pentagons and hexagons
//     spacing : the gap between the pentagon and hexagon
module generalized_half_soccer_polyhedron(line_length, spacing = 0.5) {
	pentagon_circle_r = 0.5 * line_length / sin(36);
	offset_y = pentagon_circle_r * cos(36);

	children(0);
	
	for(i = [0:4]) {
		rotate(72 * i) 
		    generalized_pentagon_based_sub_comp(line_length, spacing) {
			    children(0);
				children(1);
			}
	}
}

// a generalized soccer polyhedron.
// Parameters:
//     line_length : the side length of pentagons and hexagons
//     spacing : the gap between the pentagon and hexagon
//     center : center it or not
module generalized_soccer_polyhedron(height, spacing = 0.5, center = true) {
    line_length = height / 6.65;
	
	offset_for_center = center ? height / 2: 0;
	
	translate([0, 0, -offset_for_center]) union() {
		translate([0, 0, -line_length + line_length * 6.64875]) 
		    generalized_half_soccer_polyhedron(line_length, spacing) {
			    generalized_pentagon(line_length, spacing) children(0);
			    generalized_hexagon(line_length, spacing) children(1);			
			}
			
		rotate(36) mirror([0, 0, 1]) translate([0, 0, -line_length]) 
		    generalized_half_soccer_polyhedron(line_length, spacing) {
			    generalized_pentagon(line_length, spacing) children(0);
			    generalized_hexagon(line_length, spacing) children(1);				
			}
	} 
}

// create a pentagon according the height of the soccer polyhedron
module pentagon_for_soccer_polyhedron(height) {
    line_length = height / 6.65;
    circle(0.5 * line_length / sin(36), $fn = 5);
}

// create a hexagon according the height of the soccer polyhedron
module hexagon_for_soccer_polyhedron(height) {
    line_length = height / 6.65;
    circle(0.5 * line_length / sin(30), $fn = 6);			
}

// create a pentagon according the height of the soccer polyhedron
module pentagon_maze_for_soccer_polyhedron(height) {
	wall_thickness = 0.68;
	radius_of_circle_wrapper = 0.5 * height / 6.6 / sin(36) - wall_thickness;
	
	cblocks = 6;
	levels = 3;
	sides = 5; 
	
	regular_polygon_maze(radius_of_circle_wrapper, cblocks, levels, wall_thickness, sides); 			
}

// create a hexagon according the height of the soccer polyhedron
module hexagon_maze_for_soccer_polyhedron(height) {
	wall_thickness = 0.68;
	radius_of_circle_wrapper = 0.5 * height / 6.6 / sin(30) - wall_thickness;
	
	cblocks = 6;
	levels = 3;
	sides = 6;
	
	regular_polygon_maze(radius_of_circle_wrapper, cblocks, levels, wall_thickness, sides);	
}

module maze_soccer_polyhedron(height, maze_in) {
    spacing = 1;
	
	sphere(height / 2 - 1); 
	
    if(maze_in == "pentagon"){
		generalized_soccer_polyhedron(height, spacing) {
			pentagon_maze_for_soccer_polyhedron(height);
			hexagon_for_soccer_polyhedron(height);
		}	
	} else if(maze_in == "hexagon"){
		generalized_soccer_polyhedron(height, spacing) {
			pentagon_for_soccer_polyhedron(height);
			hexagon_maze_for_soccer_polyhedron(height);
		}	
	} else if(maze_in == "both") {
		generalized_soccer_polyhedron(height, spacing) {
			pentagon_maze_for_soccer_polyhedron(height);
			hexagon_maze_for_soccer_polyhedron(height);
		}
	} 
}

maze_soccer_polyhedron(height, maze_in);
